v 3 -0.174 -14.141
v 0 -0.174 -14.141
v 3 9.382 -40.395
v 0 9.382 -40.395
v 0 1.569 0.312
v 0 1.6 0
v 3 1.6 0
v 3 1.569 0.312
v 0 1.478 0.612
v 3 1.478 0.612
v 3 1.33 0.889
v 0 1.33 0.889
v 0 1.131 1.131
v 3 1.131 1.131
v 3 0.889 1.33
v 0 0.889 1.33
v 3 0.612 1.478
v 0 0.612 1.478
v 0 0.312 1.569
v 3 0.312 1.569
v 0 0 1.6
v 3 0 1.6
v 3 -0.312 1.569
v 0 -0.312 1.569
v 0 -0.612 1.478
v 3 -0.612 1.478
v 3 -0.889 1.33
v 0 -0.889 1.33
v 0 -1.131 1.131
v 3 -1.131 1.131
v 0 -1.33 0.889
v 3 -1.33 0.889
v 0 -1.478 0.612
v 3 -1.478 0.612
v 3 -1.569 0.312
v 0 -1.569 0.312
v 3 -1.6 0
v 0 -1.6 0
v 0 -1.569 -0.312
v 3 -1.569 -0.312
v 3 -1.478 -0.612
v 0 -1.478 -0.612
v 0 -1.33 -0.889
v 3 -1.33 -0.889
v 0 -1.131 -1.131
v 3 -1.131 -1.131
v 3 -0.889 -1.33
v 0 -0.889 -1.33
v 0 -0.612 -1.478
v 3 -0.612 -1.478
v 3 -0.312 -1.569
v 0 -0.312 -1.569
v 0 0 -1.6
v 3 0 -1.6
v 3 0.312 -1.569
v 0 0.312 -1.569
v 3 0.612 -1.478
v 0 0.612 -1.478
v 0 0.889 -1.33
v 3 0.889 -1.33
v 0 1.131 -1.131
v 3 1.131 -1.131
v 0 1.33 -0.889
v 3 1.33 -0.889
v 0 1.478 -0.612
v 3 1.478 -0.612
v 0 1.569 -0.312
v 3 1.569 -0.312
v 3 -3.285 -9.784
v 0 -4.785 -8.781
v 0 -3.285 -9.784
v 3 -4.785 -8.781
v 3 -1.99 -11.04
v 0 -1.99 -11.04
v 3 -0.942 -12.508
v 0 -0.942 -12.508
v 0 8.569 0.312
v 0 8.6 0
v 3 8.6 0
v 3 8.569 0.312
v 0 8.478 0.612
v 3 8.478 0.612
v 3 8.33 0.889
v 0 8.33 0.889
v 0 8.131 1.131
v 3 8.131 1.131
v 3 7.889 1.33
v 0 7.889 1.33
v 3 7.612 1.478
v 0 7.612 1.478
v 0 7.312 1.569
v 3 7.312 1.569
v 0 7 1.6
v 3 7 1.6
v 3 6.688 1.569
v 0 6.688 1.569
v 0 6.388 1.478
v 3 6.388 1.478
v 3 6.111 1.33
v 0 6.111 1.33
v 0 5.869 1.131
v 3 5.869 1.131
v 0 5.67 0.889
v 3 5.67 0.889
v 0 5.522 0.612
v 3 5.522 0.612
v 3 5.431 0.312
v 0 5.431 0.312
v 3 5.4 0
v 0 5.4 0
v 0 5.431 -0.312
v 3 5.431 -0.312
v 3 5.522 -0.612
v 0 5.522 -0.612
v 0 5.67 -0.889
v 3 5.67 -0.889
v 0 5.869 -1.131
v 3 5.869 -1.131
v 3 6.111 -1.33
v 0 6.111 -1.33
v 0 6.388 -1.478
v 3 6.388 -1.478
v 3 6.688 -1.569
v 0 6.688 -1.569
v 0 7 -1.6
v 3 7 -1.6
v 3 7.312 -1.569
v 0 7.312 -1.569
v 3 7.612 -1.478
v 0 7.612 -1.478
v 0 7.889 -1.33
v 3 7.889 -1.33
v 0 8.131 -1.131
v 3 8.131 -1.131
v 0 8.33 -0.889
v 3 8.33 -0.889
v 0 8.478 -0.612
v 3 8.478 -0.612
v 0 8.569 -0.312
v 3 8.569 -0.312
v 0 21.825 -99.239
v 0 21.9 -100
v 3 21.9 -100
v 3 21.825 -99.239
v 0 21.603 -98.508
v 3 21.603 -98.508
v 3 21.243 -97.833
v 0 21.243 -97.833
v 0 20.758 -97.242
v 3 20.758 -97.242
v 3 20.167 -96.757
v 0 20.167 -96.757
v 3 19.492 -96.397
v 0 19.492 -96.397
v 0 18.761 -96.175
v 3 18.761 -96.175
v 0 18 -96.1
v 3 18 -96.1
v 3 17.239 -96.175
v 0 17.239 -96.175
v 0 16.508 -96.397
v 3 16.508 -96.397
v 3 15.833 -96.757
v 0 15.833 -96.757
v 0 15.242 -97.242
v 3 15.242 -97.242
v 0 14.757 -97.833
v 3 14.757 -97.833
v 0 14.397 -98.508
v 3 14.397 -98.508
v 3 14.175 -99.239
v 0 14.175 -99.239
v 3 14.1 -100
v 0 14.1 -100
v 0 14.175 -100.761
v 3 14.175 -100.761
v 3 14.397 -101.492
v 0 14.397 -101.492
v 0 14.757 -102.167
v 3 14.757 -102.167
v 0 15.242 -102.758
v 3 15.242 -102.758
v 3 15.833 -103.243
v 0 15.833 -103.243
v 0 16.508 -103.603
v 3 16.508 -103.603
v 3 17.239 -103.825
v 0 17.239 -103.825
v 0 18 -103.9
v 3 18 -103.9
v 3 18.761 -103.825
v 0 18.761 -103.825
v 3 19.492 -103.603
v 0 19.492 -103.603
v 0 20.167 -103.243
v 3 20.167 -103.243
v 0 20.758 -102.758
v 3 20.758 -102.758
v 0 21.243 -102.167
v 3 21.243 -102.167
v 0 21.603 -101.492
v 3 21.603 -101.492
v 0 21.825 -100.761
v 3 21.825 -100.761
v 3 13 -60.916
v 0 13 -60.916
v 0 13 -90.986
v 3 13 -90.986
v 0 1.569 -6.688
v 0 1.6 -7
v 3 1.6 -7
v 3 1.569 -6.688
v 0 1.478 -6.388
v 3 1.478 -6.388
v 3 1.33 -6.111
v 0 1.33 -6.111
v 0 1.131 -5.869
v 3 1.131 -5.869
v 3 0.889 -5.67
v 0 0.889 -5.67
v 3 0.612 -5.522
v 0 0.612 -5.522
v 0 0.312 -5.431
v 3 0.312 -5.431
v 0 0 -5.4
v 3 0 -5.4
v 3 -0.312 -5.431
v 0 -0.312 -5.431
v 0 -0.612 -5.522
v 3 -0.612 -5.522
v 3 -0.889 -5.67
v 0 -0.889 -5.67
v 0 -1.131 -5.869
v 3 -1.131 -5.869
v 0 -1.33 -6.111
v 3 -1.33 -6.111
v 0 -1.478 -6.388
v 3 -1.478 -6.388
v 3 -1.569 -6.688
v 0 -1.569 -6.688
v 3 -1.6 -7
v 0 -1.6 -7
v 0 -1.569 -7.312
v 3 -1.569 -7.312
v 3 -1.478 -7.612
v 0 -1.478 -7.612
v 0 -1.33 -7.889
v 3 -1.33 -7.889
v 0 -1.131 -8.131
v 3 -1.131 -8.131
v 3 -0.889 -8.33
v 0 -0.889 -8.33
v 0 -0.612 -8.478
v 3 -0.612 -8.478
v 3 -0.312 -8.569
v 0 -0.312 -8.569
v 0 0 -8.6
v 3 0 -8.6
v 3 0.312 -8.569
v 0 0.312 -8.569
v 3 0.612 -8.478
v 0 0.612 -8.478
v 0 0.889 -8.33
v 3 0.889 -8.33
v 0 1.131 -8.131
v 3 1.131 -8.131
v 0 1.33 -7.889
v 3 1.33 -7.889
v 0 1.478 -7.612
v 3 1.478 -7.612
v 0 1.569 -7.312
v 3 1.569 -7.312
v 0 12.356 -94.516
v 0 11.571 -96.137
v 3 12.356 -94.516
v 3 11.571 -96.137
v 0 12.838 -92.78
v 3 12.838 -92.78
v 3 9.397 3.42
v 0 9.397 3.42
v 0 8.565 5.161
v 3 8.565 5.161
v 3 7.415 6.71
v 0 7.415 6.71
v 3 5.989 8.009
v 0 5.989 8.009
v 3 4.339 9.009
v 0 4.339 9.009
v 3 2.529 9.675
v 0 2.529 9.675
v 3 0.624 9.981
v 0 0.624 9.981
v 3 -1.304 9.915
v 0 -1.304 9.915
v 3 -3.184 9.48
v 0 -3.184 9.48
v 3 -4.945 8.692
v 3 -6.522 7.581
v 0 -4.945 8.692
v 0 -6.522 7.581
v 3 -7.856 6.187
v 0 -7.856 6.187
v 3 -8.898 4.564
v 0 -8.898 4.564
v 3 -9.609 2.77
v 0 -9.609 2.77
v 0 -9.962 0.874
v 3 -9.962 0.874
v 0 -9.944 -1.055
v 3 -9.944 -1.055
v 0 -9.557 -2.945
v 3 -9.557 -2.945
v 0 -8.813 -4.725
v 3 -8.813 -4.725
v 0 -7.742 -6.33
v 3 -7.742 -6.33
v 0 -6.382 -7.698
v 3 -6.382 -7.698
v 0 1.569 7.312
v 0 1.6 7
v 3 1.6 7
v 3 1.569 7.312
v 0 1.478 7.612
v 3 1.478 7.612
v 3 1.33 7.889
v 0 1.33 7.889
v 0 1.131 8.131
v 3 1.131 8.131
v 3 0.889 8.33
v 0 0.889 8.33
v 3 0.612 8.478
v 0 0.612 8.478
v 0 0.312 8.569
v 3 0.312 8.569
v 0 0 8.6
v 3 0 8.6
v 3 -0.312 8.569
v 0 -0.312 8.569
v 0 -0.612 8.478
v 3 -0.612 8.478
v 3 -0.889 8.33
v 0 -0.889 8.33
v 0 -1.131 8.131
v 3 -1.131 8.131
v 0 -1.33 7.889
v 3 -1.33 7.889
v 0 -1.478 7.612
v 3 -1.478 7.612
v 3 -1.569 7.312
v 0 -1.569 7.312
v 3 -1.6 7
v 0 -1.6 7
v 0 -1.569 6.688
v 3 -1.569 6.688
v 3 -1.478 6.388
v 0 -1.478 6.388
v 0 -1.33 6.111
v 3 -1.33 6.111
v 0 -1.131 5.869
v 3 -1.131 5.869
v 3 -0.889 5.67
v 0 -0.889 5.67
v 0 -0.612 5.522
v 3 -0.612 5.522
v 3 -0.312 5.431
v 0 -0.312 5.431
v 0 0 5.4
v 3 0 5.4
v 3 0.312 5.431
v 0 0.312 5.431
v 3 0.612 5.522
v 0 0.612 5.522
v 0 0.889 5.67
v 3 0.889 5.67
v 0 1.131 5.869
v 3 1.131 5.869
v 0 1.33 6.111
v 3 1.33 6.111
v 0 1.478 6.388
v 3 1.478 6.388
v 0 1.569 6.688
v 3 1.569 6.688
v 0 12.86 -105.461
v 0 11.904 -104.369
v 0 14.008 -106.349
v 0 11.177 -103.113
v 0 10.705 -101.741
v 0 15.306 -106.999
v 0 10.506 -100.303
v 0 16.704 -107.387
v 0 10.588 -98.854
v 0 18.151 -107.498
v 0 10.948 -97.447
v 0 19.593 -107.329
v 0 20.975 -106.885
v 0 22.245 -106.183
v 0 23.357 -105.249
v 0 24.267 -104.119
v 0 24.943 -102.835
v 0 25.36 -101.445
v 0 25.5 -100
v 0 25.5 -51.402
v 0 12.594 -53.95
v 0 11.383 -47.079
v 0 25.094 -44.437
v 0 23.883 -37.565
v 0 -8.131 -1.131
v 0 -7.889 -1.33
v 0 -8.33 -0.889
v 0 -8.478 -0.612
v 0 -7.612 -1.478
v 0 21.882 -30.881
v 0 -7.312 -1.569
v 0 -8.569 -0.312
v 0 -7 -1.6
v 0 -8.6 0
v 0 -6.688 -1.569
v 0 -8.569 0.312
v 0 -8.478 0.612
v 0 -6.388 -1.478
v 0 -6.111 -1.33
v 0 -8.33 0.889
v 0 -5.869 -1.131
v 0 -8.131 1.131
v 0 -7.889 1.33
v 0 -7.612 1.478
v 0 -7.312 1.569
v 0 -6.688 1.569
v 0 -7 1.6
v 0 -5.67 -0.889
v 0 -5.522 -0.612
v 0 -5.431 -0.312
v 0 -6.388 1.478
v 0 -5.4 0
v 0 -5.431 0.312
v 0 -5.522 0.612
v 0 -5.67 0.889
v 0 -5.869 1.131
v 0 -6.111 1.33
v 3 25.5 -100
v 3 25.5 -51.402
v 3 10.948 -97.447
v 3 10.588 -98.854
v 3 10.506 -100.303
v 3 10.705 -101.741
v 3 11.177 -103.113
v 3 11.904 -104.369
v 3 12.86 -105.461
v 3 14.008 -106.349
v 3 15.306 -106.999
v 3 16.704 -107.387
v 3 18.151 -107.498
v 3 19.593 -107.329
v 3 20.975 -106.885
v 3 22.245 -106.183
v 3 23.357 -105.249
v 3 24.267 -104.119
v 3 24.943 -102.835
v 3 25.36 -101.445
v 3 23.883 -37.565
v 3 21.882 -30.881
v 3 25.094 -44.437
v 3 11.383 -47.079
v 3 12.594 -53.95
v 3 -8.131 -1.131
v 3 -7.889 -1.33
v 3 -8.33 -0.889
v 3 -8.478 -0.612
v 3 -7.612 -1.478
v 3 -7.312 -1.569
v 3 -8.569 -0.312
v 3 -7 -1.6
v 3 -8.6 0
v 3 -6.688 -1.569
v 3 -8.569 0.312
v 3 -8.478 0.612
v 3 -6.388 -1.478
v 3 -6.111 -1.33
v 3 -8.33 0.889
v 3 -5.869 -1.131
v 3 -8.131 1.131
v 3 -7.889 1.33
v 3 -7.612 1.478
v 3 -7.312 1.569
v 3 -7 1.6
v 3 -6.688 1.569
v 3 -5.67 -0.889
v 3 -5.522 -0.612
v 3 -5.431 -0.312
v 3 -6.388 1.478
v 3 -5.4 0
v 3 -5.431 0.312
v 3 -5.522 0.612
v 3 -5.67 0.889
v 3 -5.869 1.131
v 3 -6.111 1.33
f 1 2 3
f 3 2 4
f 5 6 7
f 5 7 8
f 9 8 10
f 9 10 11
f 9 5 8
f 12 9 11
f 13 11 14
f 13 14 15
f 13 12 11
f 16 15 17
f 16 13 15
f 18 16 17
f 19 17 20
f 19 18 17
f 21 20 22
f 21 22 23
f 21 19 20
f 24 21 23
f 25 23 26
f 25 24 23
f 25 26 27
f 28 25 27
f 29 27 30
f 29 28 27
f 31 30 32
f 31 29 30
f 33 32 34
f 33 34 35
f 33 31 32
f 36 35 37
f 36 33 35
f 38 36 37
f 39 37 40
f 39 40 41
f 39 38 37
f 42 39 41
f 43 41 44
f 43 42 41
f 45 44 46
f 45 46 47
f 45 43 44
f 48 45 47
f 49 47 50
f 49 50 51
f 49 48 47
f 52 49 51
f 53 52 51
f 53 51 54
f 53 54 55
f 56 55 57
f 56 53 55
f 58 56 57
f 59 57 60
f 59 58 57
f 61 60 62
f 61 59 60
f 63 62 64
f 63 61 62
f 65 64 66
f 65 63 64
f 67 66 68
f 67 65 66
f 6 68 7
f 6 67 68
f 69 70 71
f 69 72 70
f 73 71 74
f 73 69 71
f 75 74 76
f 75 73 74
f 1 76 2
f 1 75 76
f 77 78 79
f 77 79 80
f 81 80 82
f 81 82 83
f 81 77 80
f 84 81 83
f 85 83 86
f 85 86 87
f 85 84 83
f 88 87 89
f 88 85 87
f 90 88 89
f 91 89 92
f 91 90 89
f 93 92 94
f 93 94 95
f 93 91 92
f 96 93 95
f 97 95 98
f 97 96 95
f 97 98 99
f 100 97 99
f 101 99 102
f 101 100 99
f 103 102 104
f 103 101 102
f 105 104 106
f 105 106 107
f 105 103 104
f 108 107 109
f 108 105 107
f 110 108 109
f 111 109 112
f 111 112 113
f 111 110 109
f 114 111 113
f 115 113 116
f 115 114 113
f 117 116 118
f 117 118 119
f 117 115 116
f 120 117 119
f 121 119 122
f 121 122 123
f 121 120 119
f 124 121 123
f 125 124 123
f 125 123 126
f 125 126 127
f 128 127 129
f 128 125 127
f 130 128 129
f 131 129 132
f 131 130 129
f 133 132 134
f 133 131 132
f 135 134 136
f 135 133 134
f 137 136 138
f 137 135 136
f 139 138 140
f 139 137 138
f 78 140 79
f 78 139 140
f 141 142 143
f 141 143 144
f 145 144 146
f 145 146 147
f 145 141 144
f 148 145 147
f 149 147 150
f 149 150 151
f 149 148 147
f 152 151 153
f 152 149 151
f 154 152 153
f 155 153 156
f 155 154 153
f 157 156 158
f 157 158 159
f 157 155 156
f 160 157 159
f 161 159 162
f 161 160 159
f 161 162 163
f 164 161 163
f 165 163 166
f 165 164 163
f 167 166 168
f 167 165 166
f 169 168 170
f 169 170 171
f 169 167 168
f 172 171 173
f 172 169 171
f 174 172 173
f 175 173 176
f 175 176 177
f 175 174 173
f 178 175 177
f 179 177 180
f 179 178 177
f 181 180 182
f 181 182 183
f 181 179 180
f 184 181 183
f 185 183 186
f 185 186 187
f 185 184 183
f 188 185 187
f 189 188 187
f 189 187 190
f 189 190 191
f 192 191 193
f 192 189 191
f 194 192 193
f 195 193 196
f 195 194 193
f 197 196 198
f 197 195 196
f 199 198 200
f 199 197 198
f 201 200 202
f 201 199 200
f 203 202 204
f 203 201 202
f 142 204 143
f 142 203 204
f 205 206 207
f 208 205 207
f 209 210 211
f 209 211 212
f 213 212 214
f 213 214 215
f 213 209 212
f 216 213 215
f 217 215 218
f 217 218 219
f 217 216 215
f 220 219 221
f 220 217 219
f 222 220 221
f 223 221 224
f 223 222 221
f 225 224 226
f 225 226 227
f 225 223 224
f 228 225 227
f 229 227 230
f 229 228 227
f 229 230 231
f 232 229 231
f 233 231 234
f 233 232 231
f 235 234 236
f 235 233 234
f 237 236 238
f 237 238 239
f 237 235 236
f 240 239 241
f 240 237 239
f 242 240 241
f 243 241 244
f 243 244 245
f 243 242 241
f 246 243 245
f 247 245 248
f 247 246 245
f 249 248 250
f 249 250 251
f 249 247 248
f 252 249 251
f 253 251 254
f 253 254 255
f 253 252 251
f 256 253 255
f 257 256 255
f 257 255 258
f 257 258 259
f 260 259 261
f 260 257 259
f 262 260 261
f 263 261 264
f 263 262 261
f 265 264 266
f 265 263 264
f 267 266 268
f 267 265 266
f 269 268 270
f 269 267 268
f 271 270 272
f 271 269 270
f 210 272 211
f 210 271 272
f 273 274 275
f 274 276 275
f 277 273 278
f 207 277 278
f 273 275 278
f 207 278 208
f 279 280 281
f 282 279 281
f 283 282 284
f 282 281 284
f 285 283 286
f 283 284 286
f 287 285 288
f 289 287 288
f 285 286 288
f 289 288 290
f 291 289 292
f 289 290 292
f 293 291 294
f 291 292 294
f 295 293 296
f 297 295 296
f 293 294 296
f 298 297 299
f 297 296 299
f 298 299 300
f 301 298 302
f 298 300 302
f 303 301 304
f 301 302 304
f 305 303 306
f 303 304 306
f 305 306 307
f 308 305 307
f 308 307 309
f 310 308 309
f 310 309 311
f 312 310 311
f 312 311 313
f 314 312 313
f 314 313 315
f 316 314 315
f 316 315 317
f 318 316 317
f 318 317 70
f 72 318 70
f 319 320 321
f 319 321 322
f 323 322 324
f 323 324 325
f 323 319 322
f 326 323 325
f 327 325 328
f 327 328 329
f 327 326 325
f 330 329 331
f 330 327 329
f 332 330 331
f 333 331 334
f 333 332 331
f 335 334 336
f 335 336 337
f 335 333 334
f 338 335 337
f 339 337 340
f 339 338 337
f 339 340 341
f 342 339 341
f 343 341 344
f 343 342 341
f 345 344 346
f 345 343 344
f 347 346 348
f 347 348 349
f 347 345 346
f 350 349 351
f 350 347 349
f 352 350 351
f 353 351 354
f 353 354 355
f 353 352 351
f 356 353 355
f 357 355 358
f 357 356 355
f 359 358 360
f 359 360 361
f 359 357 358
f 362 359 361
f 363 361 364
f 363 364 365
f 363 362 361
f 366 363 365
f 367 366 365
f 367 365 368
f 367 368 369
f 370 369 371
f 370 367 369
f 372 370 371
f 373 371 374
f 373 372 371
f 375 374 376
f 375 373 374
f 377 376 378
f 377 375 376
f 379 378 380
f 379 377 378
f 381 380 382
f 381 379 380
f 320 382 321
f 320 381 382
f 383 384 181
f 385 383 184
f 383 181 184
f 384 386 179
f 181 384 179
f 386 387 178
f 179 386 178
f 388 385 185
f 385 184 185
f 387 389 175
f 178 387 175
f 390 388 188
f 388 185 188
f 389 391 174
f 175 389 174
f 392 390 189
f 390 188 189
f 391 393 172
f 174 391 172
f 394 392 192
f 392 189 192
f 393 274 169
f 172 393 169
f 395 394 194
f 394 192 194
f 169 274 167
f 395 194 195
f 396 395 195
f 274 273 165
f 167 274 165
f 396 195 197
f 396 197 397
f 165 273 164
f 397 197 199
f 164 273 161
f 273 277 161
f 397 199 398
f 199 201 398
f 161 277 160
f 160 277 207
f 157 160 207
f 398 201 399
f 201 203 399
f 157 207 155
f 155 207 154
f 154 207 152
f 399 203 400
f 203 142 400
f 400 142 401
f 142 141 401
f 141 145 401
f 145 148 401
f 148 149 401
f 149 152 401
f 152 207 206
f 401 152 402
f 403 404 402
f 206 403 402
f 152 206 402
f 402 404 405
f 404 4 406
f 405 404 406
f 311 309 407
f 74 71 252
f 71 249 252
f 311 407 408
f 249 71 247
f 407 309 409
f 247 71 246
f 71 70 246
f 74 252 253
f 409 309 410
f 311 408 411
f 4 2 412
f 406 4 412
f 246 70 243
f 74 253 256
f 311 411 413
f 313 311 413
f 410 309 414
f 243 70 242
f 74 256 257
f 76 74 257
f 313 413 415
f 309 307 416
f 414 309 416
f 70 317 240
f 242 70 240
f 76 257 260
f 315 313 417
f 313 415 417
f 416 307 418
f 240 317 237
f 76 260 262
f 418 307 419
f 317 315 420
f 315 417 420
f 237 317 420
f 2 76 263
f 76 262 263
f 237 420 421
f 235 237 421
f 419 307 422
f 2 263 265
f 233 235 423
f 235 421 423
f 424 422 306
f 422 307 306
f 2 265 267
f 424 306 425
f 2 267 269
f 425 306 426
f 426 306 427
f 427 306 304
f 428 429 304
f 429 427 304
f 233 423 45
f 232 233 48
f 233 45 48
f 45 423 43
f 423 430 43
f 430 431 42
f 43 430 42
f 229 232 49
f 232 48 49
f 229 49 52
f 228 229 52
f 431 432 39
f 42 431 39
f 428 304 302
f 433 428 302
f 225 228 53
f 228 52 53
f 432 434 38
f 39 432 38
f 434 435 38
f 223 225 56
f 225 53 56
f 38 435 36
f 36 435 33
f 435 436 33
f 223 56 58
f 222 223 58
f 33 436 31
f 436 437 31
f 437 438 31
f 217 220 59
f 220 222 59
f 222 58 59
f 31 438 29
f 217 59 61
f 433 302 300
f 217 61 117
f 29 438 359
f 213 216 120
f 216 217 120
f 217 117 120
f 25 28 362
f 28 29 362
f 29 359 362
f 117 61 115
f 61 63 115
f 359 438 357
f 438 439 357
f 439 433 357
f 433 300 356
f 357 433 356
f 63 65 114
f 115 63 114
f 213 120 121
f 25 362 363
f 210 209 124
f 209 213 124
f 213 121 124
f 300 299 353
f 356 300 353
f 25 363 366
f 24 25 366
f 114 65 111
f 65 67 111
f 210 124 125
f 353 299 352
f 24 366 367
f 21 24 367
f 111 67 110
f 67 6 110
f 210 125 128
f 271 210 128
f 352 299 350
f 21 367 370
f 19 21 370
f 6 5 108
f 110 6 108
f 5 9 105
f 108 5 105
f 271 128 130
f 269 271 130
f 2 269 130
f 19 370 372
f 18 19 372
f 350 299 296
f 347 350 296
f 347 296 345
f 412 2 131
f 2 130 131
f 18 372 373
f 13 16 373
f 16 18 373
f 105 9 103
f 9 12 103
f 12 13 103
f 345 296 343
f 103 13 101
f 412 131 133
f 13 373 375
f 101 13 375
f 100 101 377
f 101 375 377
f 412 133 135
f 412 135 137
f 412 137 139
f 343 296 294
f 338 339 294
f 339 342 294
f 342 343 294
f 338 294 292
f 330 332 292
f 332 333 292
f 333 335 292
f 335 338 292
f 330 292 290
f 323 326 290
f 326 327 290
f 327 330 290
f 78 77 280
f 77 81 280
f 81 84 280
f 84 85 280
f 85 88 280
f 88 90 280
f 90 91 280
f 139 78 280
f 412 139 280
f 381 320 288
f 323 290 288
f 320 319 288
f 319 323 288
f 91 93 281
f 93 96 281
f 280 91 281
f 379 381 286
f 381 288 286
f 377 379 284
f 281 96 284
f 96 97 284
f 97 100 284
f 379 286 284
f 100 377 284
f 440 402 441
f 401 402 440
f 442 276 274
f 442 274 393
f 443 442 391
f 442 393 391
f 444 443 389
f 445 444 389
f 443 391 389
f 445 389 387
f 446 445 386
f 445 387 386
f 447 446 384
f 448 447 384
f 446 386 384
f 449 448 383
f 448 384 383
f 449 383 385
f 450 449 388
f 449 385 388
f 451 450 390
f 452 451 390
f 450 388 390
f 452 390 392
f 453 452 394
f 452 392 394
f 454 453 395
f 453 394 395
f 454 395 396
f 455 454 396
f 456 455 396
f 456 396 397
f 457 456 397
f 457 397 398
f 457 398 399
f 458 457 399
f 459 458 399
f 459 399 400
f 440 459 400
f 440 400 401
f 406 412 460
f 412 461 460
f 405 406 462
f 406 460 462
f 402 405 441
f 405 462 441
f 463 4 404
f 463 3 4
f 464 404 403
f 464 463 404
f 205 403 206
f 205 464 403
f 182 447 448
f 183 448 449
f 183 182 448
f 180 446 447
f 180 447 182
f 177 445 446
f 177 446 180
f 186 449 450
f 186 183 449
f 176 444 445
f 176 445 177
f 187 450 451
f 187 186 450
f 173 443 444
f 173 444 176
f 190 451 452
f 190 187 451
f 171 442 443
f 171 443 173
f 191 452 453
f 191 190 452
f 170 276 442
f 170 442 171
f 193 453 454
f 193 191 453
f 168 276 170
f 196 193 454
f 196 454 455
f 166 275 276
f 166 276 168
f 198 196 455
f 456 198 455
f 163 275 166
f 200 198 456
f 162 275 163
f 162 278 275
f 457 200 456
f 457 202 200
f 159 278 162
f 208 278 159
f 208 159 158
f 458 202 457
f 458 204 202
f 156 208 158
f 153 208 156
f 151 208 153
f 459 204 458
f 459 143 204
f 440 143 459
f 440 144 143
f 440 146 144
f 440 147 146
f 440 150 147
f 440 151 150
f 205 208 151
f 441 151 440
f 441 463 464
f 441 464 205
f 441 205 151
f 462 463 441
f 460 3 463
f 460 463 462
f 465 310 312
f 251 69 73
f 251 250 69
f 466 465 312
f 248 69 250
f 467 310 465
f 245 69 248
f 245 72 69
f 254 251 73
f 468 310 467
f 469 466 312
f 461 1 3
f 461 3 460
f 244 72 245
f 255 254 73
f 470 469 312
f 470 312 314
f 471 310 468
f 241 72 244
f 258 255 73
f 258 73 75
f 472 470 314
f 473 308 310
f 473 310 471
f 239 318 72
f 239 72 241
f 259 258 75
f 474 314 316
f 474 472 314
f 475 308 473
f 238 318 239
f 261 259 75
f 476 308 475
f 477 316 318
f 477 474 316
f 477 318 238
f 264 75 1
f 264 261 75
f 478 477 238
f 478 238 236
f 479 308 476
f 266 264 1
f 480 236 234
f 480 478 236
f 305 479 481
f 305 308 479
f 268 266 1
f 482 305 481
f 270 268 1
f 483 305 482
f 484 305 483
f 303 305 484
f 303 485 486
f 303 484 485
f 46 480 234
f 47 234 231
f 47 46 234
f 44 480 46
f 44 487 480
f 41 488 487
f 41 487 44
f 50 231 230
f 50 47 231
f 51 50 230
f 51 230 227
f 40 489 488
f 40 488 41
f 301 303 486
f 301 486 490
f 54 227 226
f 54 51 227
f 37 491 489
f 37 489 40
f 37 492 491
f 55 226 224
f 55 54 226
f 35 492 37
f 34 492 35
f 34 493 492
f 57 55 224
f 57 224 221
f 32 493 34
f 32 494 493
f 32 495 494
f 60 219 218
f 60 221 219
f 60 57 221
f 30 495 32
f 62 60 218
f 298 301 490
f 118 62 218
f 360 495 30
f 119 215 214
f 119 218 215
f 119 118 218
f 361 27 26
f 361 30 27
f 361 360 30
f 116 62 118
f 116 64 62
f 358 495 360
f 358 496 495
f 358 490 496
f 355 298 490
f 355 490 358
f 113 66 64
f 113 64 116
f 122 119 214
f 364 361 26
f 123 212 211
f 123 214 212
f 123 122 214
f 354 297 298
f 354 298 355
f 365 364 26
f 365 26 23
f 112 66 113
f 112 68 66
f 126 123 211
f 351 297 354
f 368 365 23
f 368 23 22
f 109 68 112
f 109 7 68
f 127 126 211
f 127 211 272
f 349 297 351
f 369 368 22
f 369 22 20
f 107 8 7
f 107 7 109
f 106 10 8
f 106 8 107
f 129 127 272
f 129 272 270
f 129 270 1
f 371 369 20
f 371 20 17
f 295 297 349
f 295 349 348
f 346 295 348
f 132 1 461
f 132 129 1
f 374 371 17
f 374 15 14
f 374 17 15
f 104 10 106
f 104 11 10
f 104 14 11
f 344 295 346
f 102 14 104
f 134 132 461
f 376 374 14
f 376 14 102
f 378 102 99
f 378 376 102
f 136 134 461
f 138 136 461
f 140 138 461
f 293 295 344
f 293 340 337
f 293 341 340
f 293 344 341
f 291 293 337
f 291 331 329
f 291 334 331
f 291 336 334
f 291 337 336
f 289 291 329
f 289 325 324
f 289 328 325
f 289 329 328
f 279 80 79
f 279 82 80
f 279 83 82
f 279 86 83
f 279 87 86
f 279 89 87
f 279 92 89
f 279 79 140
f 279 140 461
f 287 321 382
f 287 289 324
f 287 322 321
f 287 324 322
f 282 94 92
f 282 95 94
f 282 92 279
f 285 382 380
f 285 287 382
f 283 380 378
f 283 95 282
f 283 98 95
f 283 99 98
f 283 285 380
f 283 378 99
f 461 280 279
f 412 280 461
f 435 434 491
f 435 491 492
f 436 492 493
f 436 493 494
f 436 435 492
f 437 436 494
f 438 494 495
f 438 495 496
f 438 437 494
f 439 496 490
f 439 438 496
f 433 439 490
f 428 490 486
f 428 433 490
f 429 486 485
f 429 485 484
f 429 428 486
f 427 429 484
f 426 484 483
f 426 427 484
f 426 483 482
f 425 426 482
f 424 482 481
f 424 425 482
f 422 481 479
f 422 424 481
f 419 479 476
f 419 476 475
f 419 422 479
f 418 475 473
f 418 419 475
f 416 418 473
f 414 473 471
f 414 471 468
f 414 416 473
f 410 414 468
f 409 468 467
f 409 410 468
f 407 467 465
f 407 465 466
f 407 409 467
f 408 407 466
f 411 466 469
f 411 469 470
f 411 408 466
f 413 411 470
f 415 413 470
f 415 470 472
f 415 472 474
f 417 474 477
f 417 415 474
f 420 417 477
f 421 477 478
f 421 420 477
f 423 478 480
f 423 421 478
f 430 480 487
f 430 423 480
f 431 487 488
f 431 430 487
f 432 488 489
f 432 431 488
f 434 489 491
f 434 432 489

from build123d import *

# Parameters (mm, degrees)
SKETCH049_R   = 1.6
SKETCH049_R_2 = 3.9
PAD027_DEPTH  = 3
FILLET016_R   = 60
FILLET017_R   = 10


with BuildPart() as part:
    # Sketch049 → Pad027 (new body)
    with BuildSketch(Plane.YZ):
        with BuildLine():
            ThreePointArc((9.3969262079, 3.4202014333), (-7.6604444312, 6.4278760969), (-1.7364817767, -9.8480775301))
            Line((-1.7364817767, -9.8480775301), (13, -50.3362284537))
            Line((13, -50.3362284537), (13, -94.4098300562))
            ThreePointArc((13, -94.4098300562), (14.9381378215, -106.8465319688), (25.5, -100))
            Line((25.5, -40.8226301945), (25.5, -100))
            Line((9.3969262079, 3.4202014333), (25.5, -40.8226301945))
        make_face()
        with Locations((0, 7)):
            Circle(SKETCH049_R, mode=Mode.SUBTRACT)
        with Locations((7, 0)):
            Circle(SKETCH049_R, mode=Mode.SUBTRACT)
        with Locations((0, -7)):
            Circle(SKETCH049_R, mode=Mode.SUBTRACT)
        with Locations((-7, 0)):
            Circle(SKETCH049_R, mode=Mode.SUBTRACT)
        Circle(SKETCH049_R, mode=Mode.SUBTRACT)
        with Locations((18, -100)):
            Circle(SKETCH049_R_2, mode=Mode.SUBTRACT)
    extrude(amount=PAD027_DEPTH)

    # Fillet016
    fillet016_edges = [part.edges().sort_by_distance(p)[0] for p in [
        (1.5, 13, -50.336228),
        (1.5, 25.5, -40.82263),
    ]]
    fillet(fillet016_edges, radius=FILLET016_R)

    # Fillet017
    fillet017_edges = [part.edges().sort_by_distance(p)[0] for p in [
        (1.5, 13, -94.40983),
        (1.5, -1.736482, -9.848078),
    ]]
    fillet(fillet017_edges, radius=FILLET017_R)


solid = part.part
